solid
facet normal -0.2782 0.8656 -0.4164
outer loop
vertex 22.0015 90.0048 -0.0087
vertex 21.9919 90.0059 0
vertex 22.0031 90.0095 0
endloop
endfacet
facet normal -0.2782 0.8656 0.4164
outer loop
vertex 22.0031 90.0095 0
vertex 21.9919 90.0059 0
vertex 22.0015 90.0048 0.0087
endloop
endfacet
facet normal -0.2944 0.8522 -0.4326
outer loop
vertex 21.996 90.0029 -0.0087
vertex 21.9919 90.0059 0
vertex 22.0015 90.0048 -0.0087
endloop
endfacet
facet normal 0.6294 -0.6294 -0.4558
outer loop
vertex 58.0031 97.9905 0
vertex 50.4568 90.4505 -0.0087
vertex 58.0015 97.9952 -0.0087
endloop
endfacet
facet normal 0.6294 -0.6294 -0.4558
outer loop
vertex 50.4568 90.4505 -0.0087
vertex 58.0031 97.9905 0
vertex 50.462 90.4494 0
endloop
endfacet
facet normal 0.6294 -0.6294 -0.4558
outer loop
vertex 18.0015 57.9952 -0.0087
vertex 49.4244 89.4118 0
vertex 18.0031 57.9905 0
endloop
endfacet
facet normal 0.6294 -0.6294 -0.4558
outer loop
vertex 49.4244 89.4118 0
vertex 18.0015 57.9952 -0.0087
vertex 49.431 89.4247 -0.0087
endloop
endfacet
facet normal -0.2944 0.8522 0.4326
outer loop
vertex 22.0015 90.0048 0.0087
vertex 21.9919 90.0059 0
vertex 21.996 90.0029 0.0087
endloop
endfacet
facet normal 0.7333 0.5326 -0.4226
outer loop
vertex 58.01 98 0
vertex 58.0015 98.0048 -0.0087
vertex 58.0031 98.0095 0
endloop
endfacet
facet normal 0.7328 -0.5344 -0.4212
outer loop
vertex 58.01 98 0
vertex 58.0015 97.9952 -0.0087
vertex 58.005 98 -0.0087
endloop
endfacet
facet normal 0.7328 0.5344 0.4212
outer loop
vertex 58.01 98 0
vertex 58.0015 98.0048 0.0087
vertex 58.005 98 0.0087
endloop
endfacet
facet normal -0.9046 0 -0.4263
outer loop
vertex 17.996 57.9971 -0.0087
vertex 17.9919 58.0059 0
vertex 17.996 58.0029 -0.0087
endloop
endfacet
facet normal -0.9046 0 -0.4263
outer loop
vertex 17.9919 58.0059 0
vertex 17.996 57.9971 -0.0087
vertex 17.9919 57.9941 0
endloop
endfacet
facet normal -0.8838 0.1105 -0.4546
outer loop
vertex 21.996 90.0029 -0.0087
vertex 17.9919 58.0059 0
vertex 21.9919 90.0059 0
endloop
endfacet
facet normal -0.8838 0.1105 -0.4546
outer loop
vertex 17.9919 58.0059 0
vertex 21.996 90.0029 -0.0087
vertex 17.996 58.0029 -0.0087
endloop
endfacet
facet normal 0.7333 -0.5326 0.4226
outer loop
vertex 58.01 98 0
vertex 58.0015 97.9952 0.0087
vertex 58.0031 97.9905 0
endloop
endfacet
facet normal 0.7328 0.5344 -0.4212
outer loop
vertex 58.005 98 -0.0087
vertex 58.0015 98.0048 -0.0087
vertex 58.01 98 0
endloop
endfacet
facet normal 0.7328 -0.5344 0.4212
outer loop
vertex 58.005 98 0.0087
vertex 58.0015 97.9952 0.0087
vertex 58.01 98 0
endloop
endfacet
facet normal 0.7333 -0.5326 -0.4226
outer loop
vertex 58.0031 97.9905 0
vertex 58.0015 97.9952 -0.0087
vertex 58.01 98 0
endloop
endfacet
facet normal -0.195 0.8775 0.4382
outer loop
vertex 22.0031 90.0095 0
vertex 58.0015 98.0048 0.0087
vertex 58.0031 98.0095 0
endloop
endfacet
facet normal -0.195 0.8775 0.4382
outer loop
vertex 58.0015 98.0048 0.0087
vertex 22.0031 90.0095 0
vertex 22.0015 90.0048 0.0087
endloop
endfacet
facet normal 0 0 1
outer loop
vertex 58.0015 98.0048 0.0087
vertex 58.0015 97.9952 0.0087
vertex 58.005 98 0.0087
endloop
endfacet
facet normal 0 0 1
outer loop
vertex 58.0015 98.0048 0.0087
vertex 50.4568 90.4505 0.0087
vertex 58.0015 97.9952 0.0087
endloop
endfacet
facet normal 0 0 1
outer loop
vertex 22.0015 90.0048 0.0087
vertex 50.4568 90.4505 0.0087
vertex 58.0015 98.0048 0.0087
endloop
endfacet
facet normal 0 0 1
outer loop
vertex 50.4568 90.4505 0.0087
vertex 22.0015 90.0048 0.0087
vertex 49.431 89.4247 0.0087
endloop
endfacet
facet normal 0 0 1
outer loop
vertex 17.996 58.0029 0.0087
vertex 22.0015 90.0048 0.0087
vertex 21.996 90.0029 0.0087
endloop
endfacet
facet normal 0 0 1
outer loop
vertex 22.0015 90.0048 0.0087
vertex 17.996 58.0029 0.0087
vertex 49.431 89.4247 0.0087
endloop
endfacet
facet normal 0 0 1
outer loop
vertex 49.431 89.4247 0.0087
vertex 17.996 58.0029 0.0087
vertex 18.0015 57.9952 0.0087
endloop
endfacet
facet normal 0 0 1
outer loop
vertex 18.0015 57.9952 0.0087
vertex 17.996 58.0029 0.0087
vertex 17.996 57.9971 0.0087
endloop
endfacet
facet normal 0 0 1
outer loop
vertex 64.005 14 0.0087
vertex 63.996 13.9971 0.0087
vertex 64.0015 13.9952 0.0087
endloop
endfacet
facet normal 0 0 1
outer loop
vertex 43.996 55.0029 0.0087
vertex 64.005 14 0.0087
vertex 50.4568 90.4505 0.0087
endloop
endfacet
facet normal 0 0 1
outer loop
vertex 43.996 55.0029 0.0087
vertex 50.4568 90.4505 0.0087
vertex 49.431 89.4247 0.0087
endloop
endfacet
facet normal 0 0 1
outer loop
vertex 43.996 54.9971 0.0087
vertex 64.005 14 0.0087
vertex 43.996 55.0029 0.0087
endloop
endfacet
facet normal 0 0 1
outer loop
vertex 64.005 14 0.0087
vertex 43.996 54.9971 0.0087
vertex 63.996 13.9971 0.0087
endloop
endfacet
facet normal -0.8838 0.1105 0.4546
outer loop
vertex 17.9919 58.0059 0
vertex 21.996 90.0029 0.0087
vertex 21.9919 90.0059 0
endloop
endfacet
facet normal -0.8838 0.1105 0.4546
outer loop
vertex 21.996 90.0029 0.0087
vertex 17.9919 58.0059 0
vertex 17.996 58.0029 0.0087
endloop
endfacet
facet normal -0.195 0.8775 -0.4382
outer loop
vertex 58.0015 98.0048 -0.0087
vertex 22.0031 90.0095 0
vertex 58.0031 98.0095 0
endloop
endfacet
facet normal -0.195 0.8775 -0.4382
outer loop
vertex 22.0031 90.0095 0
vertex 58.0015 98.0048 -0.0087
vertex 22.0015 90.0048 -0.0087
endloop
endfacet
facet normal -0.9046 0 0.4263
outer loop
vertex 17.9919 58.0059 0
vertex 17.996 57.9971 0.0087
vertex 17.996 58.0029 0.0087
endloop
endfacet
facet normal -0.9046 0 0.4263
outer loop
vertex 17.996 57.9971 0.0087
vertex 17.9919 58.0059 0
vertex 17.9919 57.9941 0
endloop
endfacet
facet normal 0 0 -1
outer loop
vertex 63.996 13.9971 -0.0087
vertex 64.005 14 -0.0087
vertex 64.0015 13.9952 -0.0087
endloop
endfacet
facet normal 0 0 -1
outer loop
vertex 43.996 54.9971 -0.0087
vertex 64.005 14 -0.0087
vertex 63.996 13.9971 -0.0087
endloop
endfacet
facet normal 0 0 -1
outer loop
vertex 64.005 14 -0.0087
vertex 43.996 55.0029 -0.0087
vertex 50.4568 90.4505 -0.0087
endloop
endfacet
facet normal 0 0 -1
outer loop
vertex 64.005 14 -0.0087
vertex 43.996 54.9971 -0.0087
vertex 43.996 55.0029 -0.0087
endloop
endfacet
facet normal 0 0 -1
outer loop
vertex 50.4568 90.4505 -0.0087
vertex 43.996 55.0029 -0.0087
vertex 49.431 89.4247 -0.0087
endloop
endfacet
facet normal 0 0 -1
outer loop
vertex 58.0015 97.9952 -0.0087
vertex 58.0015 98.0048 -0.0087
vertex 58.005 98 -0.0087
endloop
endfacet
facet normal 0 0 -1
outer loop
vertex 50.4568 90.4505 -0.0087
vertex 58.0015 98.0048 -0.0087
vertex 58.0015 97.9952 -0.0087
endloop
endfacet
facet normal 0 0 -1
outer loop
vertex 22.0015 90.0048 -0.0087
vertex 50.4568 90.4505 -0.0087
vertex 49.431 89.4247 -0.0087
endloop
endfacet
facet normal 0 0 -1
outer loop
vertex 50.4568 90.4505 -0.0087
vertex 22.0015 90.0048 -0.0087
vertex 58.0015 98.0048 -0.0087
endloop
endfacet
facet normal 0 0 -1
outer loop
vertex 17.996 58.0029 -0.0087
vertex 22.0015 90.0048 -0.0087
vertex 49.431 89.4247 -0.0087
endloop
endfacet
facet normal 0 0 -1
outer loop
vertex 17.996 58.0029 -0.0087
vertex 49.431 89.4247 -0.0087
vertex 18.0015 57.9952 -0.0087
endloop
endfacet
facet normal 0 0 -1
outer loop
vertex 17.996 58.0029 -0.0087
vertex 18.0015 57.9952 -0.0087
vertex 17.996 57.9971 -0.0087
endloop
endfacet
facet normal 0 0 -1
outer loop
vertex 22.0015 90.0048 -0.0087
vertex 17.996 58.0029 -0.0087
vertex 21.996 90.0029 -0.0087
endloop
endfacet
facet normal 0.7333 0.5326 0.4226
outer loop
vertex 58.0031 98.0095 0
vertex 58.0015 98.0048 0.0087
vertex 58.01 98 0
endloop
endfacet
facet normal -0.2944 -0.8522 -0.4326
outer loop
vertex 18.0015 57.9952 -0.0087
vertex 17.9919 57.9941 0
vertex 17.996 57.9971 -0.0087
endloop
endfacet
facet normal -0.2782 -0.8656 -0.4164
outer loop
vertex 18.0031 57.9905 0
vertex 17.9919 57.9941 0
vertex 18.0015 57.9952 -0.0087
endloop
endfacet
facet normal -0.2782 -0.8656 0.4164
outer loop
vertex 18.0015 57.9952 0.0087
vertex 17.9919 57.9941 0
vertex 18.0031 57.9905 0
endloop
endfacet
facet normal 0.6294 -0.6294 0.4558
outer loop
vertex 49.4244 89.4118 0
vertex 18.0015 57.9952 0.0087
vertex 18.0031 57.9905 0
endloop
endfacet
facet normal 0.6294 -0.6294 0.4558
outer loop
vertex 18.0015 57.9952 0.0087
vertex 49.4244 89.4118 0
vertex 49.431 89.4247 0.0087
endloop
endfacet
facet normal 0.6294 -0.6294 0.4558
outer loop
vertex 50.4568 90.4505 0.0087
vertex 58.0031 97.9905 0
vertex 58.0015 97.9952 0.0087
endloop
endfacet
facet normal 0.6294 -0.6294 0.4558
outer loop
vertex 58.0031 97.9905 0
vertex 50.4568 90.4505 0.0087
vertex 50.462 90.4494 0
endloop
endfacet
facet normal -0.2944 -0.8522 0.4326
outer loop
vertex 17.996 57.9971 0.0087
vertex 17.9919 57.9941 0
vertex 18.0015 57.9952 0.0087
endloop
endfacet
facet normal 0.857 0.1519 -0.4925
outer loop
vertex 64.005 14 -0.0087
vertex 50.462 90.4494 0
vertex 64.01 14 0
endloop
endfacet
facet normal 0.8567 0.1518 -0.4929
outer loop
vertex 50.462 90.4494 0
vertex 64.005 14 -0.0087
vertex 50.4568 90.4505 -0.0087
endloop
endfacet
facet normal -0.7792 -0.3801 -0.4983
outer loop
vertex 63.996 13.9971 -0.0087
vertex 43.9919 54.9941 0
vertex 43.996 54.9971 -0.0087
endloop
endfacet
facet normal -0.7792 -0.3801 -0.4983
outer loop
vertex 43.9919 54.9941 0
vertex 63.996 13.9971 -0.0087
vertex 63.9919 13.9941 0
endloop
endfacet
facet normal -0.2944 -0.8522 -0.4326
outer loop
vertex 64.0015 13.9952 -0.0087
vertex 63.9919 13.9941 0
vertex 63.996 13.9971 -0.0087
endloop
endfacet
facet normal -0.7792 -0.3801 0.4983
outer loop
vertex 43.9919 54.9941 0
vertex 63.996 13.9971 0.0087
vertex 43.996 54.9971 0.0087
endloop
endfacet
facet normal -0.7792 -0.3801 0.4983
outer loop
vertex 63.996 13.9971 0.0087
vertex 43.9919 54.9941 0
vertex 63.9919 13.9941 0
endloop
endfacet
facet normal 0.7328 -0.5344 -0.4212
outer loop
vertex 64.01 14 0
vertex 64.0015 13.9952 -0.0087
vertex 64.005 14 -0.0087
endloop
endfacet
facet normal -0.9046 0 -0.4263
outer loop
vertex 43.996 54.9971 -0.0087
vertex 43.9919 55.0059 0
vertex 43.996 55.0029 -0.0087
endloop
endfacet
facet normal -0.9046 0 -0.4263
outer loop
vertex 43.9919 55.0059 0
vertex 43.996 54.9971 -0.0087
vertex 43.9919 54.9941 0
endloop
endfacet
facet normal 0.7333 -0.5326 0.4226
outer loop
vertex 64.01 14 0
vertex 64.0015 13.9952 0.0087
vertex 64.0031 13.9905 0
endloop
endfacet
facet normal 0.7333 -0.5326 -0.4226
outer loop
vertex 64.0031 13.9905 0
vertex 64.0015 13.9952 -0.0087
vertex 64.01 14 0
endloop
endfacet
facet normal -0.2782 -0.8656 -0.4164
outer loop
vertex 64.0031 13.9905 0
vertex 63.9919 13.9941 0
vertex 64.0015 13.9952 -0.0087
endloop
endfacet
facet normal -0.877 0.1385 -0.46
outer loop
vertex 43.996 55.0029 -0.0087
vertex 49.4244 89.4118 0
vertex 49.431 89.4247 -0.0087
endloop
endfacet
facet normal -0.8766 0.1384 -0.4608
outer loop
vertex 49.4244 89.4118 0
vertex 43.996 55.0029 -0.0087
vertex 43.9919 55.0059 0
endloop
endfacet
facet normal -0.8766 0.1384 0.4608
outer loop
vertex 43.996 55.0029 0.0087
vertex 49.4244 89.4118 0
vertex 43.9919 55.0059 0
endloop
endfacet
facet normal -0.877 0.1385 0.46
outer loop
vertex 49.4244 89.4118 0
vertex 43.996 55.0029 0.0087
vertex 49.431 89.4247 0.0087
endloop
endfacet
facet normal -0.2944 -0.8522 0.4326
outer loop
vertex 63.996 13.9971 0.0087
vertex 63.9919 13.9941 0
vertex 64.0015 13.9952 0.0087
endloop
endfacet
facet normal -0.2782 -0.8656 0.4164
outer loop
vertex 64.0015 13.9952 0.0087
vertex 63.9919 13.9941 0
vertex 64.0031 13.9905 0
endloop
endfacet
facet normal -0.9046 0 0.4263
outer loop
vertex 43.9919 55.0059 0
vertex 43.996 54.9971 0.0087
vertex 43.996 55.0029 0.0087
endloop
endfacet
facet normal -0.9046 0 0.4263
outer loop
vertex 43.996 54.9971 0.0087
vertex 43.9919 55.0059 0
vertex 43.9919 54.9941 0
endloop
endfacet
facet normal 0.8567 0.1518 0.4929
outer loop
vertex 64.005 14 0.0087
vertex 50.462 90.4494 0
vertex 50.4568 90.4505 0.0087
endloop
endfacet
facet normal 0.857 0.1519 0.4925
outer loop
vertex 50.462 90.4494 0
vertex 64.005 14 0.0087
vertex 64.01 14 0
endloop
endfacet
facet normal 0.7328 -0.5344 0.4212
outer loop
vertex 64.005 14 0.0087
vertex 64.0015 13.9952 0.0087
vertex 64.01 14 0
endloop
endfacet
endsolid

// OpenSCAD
color([0.47397172619506733,0.1502191733087036,0.9763374563976862]) hull(){
    translate([18,58]) sphere(0.01);
    translate([58,98]) sphere(0.01);
    translate([22,90]) sphere(0.01);
}
color([0.5212321316390497,0.6853418479016123,0.3398683140482872]) hull(){
    translate([50,93]) sphere(0.01);
    translate([44,55]) sphere(0.01);
    translate([64,14]) sphere(0.01);
}
